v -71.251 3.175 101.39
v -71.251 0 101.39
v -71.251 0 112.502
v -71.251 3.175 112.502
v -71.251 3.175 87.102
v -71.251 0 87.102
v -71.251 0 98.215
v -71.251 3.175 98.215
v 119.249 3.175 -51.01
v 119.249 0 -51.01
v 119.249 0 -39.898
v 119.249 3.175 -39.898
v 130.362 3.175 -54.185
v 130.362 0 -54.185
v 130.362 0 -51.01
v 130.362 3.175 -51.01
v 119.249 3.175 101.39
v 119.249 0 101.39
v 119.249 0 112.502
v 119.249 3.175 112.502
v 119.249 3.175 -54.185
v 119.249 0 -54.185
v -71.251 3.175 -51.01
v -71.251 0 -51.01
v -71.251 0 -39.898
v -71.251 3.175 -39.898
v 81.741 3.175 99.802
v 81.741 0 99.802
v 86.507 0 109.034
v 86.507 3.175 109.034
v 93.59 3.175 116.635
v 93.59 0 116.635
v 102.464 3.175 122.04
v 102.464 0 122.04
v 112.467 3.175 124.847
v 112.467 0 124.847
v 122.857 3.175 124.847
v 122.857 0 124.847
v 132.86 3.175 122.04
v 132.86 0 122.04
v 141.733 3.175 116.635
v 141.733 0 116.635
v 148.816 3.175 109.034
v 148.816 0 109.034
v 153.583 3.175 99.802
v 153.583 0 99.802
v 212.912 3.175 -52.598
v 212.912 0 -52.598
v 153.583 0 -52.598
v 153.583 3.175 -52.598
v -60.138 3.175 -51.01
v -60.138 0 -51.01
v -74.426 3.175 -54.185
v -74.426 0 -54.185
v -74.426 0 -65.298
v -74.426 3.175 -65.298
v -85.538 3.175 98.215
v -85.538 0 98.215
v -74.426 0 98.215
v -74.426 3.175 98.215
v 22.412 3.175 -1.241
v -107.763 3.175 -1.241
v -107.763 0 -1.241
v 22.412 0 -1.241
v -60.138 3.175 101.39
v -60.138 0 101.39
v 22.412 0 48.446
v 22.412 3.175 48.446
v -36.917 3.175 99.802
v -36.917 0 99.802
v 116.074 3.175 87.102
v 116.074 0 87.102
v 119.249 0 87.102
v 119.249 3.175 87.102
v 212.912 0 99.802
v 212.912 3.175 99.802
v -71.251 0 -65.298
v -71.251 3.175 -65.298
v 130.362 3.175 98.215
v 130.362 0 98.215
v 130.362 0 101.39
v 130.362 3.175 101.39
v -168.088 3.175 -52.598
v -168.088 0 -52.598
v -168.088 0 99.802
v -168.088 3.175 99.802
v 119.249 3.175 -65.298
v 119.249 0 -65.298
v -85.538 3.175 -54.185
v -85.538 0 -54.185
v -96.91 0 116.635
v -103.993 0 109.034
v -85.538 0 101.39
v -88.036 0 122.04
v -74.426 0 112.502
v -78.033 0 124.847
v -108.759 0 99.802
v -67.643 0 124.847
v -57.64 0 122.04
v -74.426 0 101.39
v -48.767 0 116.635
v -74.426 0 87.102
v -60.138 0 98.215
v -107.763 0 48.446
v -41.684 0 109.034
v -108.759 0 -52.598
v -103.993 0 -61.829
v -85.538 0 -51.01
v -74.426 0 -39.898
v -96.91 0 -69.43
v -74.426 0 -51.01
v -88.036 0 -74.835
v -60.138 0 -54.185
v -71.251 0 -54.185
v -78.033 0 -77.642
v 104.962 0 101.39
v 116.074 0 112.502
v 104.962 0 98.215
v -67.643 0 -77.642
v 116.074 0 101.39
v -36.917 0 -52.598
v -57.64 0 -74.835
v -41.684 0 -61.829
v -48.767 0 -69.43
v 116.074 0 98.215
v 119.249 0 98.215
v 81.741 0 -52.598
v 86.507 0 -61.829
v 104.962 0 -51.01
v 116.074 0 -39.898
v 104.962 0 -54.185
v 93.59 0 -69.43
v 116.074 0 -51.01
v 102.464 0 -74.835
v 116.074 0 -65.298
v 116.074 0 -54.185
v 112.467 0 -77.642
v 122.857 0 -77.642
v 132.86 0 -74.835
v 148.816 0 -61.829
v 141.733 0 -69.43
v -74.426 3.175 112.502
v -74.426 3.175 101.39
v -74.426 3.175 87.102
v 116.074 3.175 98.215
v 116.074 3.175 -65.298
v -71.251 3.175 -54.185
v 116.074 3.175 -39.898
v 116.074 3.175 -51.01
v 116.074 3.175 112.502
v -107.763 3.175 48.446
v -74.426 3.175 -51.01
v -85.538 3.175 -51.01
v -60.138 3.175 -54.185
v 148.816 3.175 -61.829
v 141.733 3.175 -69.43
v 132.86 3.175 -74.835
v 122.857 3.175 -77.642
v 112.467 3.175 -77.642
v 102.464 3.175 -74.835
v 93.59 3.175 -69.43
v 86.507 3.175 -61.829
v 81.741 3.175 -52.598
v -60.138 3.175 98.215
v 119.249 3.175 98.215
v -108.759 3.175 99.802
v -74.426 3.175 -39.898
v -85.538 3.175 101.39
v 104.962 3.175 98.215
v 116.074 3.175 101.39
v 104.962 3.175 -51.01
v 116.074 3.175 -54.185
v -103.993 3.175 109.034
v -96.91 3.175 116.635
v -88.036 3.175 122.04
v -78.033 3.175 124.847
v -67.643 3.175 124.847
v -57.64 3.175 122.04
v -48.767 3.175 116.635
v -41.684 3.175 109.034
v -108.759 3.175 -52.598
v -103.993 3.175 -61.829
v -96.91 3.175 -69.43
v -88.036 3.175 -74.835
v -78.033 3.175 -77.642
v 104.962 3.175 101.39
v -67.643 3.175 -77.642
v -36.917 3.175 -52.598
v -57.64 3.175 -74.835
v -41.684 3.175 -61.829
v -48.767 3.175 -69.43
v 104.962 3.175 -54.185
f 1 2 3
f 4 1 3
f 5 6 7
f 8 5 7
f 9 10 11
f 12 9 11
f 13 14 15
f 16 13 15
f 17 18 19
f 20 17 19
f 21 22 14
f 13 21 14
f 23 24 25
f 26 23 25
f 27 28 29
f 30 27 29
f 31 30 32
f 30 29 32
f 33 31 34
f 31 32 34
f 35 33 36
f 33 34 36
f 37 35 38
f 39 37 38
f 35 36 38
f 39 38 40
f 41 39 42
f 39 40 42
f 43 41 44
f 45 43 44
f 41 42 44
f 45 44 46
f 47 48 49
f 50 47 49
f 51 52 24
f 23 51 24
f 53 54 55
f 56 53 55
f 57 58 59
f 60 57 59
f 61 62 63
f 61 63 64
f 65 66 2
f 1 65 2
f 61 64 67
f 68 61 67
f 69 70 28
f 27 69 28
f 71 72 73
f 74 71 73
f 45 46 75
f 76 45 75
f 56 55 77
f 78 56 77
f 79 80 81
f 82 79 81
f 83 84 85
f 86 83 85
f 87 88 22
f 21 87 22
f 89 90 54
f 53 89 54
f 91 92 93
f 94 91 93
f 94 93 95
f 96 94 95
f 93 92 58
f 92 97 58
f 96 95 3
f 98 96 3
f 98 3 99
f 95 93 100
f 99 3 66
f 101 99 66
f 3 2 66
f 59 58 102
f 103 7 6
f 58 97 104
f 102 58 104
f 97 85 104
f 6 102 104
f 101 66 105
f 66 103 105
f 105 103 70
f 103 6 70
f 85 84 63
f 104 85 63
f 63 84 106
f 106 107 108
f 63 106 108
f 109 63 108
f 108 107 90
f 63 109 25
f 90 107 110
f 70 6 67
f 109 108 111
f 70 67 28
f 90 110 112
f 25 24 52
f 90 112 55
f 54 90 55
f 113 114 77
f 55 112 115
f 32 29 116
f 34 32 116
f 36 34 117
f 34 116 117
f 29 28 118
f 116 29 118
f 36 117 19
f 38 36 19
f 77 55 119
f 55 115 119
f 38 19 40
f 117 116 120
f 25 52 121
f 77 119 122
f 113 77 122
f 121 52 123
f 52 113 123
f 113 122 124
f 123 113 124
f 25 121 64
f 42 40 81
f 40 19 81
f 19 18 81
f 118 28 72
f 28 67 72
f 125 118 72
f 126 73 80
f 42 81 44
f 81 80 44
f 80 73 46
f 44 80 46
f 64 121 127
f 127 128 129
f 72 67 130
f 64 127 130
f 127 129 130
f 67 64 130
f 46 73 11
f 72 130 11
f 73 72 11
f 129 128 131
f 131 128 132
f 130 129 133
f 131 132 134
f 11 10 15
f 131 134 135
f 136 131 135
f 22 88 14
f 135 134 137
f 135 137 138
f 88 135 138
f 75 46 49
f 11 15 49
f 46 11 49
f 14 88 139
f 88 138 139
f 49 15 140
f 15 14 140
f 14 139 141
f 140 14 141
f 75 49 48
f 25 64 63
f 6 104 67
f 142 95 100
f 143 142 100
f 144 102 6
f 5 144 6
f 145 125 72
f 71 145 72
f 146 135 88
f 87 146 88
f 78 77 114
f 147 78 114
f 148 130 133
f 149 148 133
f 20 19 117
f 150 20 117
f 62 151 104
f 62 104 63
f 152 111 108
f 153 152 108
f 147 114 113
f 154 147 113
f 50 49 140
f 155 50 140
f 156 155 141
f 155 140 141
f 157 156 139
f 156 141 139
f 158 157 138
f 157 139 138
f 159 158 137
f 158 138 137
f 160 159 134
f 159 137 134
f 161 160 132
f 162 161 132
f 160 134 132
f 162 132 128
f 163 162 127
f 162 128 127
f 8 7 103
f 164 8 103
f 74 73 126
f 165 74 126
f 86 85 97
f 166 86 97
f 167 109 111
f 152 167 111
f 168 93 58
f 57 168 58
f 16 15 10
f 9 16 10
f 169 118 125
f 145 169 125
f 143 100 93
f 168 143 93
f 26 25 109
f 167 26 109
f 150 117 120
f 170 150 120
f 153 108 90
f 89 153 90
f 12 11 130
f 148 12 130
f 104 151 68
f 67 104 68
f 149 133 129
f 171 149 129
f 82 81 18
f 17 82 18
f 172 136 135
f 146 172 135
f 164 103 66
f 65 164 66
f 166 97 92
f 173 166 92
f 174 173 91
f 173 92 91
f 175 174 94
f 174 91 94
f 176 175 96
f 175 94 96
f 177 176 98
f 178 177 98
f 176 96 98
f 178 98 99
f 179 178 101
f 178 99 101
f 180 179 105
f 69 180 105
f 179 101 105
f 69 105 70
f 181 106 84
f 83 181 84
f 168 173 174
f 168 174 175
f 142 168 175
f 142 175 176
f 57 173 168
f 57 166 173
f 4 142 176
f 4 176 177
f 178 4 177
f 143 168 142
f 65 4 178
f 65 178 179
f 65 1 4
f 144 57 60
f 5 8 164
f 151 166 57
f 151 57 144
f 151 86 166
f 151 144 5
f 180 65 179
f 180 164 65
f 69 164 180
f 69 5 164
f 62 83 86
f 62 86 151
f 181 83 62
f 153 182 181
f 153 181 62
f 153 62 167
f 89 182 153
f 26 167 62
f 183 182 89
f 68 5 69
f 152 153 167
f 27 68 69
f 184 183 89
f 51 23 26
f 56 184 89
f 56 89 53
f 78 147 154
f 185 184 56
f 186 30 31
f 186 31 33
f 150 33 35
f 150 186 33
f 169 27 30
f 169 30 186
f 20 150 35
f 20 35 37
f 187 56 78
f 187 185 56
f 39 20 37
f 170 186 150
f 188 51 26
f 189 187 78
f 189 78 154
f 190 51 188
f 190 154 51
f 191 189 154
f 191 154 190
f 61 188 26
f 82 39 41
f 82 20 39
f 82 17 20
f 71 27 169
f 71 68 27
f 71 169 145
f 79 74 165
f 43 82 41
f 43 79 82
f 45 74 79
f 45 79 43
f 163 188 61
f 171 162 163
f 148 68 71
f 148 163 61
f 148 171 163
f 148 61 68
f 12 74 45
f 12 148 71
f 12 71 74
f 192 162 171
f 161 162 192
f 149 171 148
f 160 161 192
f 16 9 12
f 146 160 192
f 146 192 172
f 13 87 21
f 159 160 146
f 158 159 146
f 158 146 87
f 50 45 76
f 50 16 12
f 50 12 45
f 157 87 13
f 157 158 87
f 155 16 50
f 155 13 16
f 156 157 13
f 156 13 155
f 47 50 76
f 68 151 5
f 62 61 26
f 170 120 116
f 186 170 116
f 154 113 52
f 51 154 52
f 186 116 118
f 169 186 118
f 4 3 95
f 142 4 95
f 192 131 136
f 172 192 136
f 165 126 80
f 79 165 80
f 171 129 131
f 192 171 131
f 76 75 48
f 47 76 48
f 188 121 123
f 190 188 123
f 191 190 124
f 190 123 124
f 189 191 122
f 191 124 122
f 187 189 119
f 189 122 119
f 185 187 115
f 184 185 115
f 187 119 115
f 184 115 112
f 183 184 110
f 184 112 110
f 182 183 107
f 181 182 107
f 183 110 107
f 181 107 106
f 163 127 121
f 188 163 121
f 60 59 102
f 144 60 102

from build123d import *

# Parameters (mm, degrees)
BOSS_EXTRUDE2_DEPTH = 3.175
SKETCH2_W           = 130.175
SKETCH2_H           = 5
CUT_EXTRUDE1_DEPTH  = 10


with BuildPart() as part:
    # Sketch1 → Boss-Extrude2 (new body)
    with BuildSketch(Plane(origin=(0, 0, 0), x_dir=(1, 0, 0), z_dir=(0, 1, 0))):
        with BuildLine():
            ThreePointArc((81.740740222, -99.802389706), (117.661764706, -125.202389706), (153.58278919, -99.802389706))
            Line((153.58278919, -99.802389706), (212.911764706, -99.802389706))
            Line((212.911764706, -99.802389706), (212.911764706, 52.597610294))
            Line((212.911764706, 52.597610294), (153.58278919, 52.597610294))
            ThreePointArc((153.58278919, 52.597610294), (117.661764706, 77.997610294), (81.740740222, 52.597610294))
            Line((81.740740222, 52.597610294), (-36.91721081, 52.597610294))
            ThreePointArc((-36.91721081, 52.597610294), (-72.838235294, 77.997610294), (-108.759259778, 52.597610294))
            Line((-108.759259778, 52.597610294), (-168.088235294, 52.597610294))
            Line((-168.088235294, 52.597610294), (-168.088235294, -23.602389706))
            Line((-168.088235294, -23.602389706), (-168.088235294, -99.802389706))
            Line((-168.088235294, -99.802389706), (-108.759259778, -99.802389706))
            ThreePointArc((-108.759259778, -99.802389706), (-72.838235294, -125.202389706), (-36.91721081, -99.802389706))
            Line((-36.91721081, -99.802389706), (81.740740222, -99.802389706))
        make_face()
        Polygon((-74.425735294, -87.102389706), (-71.250735294, -87.102389706), (-71.250735294, -98.214889706), (-60.138235294, -98.214889706), (-60.138235294, -101.389889706), (-71.250735294, -101.389889706), (-71.250735294, -112.502389706), (-74.425735294, -112.502389706), (-74.425735294, -101.389889706), (-85.538235294, -101.389889706), (-85.538235294, -98.214889706), (-74.425735294, -98.214889706), align=None, mode=Mode.SUBTRACT)
        Polygon((116.074264706, -87.102389706), (119.249264706, -87.102389706), (119.249264706, -98.214889706), (130.361764706, -98.214889706), (130.361764706, -101.389889706), (119.249264706, -101.389889706), (119.249264706, -112.502389706), (116.074264706, -112.502389706), (116.074264706, -101.389889706), (104.961764706, -101.389889706), (104.961764706, -98.214889706), (116.074264706, -98.214889706), align=None, mode=Mode.SUBTRACT)
        Polygon((-107.763235294, -43.446189706), (-107.763235294, -23.602389706), (-107.763235294, -3.758589706), (22.411764706, -3.758589706), (22.411764706, -43.446189706), align=None, mode=Mode.SUBTRACT)
        Polygon((-60.138235294, 54.185110294), (-60.138235294, 51.010110294), (-71.250735294, 51.010110294), (-71.250735294, 39.897610294), (-74.425735294, 39.897610294), (-74.425735294, 51.010110294), (-85.538235294, 51.010110294), (-85.538235294, 54.185110294), (-74.425735294, 54.185110294), (-74.425735294, 65.297610294), (-71.250735294, 65.297610294), (-71.250735294, 54.185110294), align=None, mode=Mode.SUBTRACT)
        Polygon((130.361764706, 54.185110294), (130.361764706, 51.010110294), (119.249264706, 51.010110294), (119.249264706, 39.897610294), (116.074264706, 39.897610294), (116.074264706, 51.010110294), (104.961764706, 51.010110294), (104.961764706, 54.185110294), (116.074264706, 54.185110294), (116.074264706, 65.297610294), (119.249264706, 65.297610294), (119.249264706, 54.185110294), align=None, mode=Mode.SUBTRACT)
    extrude(amount=BOSS_EXTRUDE2_DEPTH)

    # Sketch2 → Cut-Extrude1 (cut)
    with BuildSketch(Plane(origin=(0, 3.175, 0), x_dir=(1, 0, 0), z_dir=(0, 1, 0))):
        with Locations((-42.675735294, -45.946189706)):
            Rectangle(SKETCH2_W, SKETCH2_H)
        with Locations((-42.675735294, -1.258589706)):
            Rectangle(SKETCH2_W, SKETCH2_H)
    extrude(amount=-CUT_EXTRUDE1_DEPTH, mode=Mode.SUBTRACT)


solid = part.part
